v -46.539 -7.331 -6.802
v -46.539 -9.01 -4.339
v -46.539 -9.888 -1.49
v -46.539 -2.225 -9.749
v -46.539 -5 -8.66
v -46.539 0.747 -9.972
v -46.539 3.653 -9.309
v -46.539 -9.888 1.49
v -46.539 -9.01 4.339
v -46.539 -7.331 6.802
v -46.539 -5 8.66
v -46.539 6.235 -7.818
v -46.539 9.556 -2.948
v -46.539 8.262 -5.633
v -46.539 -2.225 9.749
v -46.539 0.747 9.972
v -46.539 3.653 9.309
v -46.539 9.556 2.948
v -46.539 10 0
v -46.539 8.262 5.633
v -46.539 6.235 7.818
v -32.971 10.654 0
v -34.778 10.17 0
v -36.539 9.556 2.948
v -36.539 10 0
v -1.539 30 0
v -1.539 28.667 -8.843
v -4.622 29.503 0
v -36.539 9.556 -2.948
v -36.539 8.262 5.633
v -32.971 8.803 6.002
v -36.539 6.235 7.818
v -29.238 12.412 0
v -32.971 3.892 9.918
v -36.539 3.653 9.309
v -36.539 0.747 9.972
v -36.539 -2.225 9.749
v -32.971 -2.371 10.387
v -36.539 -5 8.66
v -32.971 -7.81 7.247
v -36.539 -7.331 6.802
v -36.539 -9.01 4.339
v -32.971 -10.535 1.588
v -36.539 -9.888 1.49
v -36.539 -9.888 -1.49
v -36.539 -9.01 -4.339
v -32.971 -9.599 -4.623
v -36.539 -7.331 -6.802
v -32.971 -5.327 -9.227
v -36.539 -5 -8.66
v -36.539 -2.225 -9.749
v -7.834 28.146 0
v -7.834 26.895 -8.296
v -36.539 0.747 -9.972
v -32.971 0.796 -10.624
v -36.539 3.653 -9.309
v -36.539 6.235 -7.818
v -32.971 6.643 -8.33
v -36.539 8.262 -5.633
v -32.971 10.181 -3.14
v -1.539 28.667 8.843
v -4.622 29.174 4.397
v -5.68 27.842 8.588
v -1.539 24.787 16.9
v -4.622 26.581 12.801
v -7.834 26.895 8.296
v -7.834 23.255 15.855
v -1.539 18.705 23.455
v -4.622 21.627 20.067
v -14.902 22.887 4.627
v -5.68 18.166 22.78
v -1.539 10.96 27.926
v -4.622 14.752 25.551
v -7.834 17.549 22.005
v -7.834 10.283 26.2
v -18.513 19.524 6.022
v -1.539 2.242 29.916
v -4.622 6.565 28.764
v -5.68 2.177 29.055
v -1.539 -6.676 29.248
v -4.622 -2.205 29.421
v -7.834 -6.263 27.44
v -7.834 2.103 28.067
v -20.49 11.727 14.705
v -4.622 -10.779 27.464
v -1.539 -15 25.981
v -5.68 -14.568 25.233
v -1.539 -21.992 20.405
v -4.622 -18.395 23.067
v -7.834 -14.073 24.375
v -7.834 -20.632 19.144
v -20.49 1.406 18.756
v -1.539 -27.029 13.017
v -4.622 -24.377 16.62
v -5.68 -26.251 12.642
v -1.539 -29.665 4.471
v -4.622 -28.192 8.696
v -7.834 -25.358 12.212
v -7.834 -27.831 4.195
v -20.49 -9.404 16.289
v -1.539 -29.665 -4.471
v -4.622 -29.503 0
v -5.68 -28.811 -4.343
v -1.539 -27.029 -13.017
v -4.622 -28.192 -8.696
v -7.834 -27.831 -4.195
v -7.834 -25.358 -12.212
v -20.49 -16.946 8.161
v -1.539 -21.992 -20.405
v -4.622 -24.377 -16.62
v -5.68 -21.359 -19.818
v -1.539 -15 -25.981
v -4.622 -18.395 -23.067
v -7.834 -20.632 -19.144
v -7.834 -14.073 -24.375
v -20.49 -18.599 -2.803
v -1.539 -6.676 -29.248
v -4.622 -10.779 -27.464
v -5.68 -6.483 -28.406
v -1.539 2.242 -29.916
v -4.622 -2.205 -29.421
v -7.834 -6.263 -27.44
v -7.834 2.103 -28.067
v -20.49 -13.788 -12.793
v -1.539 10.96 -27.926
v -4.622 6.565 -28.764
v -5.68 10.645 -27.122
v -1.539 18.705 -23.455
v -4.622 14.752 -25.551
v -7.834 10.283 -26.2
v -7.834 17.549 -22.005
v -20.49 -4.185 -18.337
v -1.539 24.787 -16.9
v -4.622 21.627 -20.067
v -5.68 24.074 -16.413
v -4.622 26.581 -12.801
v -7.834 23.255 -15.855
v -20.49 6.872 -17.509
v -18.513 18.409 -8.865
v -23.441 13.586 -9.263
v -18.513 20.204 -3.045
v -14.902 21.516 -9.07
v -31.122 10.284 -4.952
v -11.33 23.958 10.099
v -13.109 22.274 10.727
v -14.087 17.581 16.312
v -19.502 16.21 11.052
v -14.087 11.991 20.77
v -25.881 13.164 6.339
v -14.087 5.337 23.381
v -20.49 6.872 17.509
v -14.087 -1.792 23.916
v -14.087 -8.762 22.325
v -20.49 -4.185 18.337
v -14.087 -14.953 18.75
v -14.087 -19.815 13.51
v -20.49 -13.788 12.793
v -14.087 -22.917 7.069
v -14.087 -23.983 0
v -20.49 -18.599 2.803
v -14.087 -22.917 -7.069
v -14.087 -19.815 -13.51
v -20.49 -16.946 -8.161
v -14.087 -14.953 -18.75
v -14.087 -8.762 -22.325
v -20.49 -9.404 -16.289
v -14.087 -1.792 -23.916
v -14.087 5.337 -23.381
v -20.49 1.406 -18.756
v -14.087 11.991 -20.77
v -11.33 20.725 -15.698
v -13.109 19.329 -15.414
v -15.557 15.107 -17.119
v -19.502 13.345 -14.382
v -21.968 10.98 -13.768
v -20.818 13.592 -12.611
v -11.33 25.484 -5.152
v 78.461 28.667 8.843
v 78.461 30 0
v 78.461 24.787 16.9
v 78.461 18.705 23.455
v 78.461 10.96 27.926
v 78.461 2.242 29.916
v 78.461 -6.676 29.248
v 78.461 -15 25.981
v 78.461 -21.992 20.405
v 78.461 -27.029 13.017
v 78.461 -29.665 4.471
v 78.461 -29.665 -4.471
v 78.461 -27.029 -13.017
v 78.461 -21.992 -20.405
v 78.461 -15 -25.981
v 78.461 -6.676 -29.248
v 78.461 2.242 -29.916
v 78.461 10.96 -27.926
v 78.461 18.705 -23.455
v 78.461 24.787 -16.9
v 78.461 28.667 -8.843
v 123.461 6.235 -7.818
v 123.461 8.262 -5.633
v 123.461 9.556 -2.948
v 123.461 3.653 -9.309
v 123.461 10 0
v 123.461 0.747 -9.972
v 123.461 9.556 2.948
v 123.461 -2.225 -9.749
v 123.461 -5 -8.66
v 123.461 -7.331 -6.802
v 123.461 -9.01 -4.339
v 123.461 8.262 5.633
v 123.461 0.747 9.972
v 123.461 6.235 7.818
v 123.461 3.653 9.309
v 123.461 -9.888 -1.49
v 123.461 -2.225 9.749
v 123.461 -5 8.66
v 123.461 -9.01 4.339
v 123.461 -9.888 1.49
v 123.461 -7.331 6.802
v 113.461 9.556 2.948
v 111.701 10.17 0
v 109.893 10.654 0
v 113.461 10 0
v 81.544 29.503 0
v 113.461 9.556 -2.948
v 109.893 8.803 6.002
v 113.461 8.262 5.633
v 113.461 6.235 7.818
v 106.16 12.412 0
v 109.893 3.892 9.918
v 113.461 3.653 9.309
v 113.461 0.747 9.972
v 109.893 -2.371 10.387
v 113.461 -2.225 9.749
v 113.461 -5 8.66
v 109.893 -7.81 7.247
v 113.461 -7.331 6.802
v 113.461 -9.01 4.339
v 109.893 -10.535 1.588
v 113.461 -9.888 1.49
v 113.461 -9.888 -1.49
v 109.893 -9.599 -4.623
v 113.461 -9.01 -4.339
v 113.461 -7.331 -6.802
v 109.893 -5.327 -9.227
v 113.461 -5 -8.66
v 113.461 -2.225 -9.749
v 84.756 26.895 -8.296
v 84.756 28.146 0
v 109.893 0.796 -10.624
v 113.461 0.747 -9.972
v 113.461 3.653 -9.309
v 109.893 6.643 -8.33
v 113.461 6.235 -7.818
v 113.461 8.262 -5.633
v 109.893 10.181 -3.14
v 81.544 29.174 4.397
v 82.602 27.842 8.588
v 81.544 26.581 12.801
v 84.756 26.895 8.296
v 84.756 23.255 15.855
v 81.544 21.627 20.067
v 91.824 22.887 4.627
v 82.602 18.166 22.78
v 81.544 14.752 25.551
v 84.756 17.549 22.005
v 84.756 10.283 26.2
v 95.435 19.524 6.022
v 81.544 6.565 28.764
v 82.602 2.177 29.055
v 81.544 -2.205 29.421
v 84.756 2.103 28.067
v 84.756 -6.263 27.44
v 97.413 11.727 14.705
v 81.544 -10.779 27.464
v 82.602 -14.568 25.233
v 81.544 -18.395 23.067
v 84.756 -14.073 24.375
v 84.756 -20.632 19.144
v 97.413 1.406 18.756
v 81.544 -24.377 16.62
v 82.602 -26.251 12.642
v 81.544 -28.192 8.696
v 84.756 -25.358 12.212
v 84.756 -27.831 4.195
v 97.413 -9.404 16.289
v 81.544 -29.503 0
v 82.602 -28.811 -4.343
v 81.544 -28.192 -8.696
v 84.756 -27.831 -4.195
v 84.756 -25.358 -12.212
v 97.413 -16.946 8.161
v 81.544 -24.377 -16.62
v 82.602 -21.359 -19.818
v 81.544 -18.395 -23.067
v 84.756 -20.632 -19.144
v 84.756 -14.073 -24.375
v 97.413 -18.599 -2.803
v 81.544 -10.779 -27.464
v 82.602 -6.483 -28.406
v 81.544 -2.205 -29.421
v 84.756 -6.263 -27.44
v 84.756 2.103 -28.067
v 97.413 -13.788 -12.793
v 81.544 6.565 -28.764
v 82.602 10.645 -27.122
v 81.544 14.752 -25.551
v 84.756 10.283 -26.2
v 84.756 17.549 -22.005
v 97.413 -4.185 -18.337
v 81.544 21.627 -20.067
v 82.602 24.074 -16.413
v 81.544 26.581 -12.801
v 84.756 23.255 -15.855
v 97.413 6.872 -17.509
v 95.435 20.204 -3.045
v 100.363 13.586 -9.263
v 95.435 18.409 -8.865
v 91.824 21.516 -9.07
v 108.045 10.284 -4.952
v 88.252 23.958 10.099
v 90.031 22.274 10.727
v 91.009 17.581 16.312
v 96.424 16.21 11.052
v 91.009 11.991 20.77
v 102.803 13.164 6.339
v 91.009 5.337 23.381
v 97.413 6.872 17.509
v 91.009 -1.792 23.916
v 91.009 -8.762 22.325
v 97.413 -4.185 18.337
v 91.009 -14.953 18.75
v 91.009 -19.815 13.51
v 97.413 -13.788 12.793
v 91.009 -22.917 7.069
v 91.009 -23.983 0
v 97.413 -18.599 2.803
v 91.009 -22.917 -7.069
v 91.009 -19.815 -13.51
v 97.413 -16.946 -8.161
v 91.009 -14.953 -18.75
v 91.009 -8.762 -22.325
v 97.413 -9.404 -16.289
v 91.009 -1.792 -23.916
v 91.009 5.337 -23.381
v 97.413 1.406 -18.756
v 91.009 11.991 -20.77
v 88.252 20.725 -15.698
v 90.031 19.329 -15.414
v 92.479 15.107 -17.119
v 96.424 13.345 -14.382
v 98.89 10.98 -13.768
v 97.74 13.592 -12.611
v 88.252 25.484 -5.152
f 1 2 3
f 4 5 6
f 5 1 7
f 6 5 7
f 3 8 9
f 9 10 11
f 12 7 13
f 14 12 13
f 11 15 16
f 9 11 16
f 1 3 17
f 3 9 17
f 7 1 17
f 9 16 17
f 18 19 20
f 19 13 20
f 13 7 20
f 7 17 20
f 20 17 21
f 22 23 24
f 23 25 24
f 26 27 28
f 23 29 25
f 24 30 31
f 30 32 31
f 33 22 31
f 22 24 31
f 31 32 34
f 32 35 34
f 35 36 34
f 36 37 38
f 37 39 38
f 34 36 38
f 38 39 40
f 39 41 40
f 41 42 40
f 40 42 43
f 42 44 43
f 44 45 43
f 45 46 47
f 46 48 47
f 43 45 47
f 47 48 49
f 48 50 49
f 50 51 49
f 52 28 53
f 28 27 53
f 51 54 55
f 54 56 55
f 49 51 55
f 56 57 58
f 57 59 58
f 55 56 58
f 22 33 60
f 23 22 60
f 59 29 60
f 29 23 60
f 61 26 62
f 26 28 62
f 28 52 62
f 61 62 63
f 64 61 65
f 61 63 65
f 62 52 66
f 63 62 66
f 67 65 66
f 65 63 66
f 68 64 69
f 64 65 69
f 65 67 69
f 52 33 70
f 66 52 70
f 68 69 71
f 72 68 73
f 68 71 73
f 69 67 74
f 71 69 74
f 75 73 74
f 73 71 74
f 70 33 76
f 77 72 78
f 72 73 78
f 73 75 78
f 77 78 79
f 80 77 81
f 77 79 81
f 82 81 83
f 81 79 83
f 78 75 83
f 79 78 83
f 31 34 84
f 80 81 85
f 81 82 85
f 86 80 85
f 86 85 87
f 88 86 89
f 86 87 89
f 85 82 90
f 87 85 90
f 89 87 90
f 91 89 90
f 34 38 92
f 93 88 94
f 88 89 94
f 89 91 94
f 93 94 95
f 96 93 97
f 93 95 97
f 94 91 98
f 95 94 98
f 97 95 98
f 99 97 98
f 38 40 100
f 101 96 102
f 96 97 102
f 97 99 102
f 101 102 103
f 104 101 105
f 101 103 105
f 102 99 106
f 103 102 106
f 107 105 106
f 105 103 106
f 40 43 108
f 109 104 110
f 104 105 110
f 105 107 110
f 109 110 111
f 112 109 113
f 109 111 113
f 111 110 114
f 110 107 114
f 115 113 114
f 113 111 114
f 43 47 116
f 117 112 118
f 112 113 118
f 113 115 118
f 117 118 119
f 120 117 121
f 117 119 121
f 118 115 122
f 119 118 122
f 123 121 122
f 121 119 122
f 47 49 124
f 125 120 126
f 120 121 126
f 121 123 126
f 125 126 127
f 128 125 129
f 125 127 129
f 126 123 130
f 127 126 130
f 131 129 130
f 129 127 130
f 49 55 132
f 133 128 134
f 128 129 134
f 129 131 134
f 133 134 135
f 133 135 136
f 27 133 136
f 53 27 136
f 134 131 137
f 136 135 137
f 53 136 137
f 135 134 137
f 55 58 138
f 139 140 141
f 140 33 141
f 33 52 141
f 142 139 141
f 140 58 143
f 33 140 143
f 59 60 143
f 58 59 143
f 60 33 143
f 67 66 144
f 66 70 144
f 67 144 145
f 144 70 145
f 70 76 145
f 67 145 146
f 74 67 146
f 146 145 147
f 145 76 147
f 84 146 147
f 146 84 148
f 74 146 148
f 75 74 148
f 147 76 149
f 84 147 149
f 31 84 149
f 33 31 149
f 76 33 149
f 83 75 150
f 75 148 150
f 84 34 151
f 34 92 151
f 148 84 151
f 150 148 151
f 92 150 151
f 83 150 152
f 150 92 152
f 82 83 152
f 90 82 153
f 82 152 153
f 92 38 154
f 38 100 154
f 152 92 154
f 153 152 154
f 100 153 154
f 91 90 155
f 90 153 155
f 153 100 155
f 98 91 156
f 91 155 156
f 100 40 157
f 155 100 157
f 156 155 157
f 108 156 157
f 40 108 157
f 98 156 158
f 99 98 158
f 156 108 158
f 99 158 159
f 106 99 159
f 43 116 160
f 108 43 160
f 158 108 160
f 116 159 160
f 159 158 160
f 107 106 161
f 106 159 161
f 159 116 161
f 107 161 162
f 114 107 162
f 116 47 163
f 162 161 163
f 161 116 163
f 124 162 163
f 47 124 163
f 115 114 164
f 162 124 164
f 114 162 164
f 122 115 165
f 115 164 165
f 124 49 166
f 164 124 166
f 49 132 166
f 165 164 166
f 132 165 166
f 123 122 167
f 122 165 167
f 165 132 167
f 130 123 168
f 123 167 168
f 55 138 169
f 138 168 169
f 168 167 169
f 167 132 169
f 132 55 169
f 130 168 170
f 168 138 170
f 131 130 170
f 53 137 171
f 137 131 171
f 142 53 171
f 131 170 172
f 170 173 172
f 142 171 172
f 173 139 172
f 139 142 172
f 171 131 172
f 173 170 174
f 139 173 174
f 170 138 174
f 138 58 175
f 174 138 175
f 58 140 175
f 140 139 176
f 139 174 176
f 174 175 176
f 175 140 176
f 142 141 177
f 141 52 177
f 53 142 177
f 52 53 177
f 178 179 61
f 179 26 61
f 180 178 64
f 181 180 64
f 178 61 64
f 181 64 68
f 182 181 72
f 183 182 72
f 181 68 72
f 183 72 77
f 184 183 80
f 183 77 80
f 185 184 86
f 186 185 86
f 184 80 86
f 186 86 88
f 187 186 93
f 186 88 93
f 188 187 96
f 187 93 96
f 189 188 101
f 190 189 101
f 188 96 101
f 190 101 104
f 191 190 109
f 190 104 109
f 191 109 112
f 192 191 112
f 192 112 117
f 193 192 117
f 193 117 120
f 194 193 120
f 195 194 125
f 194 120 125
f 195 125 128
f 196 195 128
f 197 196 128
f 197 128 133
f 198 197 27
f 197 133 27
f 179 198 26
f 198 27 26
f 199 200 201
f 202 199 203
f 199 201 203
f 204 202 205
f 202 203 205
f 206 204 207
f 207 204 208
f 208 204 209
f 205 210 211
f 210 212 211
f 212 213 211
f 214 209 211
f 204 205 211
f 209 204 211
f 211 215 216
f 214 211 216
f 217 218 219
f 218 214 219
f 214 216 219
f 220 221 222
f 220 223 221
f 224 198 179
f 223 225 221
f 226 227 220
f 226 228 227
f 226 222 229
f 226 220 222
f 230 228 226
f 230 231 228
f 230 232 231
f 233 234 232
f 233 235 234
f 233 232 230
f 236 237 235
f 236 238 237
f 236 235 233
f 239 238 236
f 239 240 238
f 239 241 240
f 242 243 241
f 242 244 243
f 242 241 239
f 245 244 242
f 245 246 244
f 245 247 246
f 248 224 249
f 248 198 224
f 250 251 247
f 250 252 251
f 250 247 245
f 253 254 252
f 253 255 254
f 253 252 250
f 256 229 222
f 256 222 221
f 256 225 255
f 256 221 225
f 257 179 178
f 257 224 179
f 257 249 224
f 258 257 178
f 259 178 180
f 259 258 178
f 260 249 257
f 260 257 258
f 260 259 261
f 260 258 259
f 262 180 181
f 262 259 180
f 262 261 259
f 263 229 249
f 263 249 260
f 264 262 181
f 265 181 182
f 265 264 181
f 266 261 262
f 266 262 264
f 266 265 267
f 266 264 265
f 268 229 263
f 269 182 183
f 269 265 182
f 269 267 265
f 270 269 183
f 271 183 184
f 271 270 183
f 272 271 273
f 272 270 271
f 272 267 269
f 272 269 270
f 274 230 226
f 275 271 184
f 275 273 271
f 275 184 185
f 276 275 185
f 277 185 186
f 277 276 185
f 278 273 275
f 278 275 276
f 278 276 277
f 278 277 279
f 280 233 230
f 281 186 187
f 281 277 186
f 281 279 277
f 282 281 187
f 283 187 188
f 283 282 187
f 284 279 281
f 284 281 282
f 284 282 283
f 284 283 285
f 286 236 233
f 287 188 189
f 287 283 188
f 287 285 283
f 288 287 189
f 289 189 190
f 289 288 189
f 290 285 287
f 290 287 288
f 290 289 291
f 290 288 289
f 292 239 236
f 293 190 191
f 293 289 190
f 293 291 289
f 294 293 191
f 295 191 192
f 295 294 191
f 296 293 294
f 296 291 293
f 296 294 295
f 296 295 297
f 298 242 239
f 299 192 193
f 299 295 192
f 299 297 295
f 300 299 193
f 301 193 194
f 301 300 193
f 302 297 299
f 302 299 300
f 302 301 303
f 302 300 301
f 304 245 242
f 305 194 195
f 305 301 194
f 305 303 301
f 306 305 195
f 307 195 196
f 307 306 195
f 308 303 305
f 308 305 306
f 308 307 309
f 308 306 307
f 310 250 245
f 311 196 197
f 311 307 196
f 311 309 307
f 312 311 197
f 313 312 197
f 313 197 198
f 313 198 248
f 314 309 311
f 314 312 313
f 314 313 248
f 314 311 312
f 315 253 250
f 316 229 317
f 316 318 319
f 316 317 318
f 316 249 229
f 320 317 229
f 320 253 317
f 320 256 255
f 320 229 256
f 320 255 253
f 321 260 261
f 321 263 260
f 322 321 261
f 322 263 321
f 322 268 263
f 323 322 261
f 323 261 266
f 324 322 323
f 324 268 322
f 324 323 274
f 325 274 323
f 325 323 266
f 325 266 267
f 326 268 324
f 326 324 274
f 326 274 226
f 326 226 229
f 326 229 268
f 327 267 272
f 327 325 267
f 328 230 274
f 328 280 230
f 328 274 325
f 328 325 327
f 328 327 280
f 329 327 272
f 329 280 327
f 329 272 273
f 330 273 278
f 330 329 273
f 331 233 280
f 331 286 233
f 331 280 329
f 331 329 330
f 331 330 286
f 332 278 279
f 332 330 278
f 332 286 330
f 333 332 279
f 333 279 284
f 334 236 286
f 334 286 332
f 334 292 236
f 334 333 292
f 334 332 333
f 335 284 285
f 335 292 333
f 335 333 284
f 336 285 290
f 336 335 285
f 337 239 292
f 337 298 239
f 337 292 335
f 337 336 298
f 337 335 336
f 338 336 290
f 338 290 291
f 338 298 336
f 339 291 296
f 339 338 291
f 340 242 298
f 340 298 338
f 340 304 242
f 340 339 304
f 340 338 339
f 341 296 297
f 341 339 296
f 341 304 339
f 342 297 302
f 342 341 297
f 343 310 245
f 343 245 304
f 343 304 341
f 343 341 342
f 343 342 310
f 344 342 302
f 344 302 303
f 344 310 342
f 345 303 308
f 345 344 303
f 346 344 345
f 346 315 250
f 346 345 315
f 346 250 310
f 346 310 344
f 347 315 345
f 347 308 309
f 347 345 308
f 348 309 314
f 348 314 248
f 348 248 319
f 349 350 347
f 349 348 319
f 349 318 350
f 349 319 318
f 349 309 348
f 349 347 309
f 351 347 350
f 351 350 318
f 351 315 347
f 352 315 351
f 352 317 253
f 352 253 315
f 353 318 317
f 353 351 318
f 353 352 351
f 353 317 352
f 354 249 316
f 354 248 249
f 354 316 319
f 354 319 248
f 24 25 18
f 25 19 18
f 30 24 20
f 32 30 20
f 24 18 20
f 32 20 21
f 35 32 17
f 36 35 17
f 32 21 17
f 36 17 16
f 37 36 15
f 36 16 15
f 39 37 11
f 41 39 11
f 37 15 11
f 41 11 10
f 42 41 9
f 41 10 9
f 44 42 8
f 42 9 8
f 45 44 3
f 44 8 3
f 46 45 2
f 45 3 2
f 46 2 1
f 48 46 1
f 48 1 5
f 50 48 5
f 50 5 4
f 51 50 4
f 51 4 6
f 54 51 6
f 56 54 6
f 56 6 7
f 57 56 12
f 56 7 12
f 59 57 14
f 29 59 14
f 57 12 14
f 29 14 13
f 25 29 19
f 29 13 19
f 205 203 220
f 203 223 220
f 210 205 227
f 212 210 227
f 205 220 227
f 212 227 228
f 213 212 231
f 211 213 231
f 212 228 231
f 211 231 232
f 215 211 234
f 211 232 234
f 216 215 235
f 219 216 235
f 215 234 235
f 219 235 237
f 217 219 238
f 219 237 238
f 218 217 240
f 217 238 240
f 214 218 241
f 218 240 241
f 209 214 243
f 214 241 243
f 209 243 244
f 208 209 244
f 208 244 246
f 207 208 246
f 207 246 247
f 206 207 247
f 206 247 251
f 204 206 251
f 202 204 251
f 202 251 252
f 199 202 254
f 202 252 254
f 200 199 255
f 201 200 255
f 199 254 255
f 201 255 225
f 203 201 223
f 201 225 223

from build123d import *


with BuildPart() as f1:
    # F0 (on Top) → F1 (revolve)
    with BuildSketch(Plane.XY):
        with BuildLine():
            Line((-36.538901, 10), (-46.538901, 10))
            Line((-46.538901, 10), (-46.538901, 0))
            Line((-46.538901, 0), (123.461099, 0))
            Line((123.461099, 0), (123.461099, 10))
            Line((123.461099, 10), (113.461099, 10))
            add(Edge.make_bspline(
                [(78.461099, 30), (89.132972, 30), (102.789225, 10), (113.461099, 10)],
                knots=[0, 0, 0, 0, 40.311289, 40.311289, 40.311289, 40.311289], degree=3))
            Line((78.461099, 30), (-1.538901, 30))
            add(Edge.make_bspline(
                [(-1.538901, 30), (-12.210775, 30), (-25.867028, 10), (-36.538901, 10)],
                knots=[0, 0, 0, 0, 40.311289, 40.311289, 40.311289, 40.311289], degree=3))
        make_face()
    revolve(axis=Axis((15.960287, 0, 0), (1, 0, 0)))


solid = f1.part
